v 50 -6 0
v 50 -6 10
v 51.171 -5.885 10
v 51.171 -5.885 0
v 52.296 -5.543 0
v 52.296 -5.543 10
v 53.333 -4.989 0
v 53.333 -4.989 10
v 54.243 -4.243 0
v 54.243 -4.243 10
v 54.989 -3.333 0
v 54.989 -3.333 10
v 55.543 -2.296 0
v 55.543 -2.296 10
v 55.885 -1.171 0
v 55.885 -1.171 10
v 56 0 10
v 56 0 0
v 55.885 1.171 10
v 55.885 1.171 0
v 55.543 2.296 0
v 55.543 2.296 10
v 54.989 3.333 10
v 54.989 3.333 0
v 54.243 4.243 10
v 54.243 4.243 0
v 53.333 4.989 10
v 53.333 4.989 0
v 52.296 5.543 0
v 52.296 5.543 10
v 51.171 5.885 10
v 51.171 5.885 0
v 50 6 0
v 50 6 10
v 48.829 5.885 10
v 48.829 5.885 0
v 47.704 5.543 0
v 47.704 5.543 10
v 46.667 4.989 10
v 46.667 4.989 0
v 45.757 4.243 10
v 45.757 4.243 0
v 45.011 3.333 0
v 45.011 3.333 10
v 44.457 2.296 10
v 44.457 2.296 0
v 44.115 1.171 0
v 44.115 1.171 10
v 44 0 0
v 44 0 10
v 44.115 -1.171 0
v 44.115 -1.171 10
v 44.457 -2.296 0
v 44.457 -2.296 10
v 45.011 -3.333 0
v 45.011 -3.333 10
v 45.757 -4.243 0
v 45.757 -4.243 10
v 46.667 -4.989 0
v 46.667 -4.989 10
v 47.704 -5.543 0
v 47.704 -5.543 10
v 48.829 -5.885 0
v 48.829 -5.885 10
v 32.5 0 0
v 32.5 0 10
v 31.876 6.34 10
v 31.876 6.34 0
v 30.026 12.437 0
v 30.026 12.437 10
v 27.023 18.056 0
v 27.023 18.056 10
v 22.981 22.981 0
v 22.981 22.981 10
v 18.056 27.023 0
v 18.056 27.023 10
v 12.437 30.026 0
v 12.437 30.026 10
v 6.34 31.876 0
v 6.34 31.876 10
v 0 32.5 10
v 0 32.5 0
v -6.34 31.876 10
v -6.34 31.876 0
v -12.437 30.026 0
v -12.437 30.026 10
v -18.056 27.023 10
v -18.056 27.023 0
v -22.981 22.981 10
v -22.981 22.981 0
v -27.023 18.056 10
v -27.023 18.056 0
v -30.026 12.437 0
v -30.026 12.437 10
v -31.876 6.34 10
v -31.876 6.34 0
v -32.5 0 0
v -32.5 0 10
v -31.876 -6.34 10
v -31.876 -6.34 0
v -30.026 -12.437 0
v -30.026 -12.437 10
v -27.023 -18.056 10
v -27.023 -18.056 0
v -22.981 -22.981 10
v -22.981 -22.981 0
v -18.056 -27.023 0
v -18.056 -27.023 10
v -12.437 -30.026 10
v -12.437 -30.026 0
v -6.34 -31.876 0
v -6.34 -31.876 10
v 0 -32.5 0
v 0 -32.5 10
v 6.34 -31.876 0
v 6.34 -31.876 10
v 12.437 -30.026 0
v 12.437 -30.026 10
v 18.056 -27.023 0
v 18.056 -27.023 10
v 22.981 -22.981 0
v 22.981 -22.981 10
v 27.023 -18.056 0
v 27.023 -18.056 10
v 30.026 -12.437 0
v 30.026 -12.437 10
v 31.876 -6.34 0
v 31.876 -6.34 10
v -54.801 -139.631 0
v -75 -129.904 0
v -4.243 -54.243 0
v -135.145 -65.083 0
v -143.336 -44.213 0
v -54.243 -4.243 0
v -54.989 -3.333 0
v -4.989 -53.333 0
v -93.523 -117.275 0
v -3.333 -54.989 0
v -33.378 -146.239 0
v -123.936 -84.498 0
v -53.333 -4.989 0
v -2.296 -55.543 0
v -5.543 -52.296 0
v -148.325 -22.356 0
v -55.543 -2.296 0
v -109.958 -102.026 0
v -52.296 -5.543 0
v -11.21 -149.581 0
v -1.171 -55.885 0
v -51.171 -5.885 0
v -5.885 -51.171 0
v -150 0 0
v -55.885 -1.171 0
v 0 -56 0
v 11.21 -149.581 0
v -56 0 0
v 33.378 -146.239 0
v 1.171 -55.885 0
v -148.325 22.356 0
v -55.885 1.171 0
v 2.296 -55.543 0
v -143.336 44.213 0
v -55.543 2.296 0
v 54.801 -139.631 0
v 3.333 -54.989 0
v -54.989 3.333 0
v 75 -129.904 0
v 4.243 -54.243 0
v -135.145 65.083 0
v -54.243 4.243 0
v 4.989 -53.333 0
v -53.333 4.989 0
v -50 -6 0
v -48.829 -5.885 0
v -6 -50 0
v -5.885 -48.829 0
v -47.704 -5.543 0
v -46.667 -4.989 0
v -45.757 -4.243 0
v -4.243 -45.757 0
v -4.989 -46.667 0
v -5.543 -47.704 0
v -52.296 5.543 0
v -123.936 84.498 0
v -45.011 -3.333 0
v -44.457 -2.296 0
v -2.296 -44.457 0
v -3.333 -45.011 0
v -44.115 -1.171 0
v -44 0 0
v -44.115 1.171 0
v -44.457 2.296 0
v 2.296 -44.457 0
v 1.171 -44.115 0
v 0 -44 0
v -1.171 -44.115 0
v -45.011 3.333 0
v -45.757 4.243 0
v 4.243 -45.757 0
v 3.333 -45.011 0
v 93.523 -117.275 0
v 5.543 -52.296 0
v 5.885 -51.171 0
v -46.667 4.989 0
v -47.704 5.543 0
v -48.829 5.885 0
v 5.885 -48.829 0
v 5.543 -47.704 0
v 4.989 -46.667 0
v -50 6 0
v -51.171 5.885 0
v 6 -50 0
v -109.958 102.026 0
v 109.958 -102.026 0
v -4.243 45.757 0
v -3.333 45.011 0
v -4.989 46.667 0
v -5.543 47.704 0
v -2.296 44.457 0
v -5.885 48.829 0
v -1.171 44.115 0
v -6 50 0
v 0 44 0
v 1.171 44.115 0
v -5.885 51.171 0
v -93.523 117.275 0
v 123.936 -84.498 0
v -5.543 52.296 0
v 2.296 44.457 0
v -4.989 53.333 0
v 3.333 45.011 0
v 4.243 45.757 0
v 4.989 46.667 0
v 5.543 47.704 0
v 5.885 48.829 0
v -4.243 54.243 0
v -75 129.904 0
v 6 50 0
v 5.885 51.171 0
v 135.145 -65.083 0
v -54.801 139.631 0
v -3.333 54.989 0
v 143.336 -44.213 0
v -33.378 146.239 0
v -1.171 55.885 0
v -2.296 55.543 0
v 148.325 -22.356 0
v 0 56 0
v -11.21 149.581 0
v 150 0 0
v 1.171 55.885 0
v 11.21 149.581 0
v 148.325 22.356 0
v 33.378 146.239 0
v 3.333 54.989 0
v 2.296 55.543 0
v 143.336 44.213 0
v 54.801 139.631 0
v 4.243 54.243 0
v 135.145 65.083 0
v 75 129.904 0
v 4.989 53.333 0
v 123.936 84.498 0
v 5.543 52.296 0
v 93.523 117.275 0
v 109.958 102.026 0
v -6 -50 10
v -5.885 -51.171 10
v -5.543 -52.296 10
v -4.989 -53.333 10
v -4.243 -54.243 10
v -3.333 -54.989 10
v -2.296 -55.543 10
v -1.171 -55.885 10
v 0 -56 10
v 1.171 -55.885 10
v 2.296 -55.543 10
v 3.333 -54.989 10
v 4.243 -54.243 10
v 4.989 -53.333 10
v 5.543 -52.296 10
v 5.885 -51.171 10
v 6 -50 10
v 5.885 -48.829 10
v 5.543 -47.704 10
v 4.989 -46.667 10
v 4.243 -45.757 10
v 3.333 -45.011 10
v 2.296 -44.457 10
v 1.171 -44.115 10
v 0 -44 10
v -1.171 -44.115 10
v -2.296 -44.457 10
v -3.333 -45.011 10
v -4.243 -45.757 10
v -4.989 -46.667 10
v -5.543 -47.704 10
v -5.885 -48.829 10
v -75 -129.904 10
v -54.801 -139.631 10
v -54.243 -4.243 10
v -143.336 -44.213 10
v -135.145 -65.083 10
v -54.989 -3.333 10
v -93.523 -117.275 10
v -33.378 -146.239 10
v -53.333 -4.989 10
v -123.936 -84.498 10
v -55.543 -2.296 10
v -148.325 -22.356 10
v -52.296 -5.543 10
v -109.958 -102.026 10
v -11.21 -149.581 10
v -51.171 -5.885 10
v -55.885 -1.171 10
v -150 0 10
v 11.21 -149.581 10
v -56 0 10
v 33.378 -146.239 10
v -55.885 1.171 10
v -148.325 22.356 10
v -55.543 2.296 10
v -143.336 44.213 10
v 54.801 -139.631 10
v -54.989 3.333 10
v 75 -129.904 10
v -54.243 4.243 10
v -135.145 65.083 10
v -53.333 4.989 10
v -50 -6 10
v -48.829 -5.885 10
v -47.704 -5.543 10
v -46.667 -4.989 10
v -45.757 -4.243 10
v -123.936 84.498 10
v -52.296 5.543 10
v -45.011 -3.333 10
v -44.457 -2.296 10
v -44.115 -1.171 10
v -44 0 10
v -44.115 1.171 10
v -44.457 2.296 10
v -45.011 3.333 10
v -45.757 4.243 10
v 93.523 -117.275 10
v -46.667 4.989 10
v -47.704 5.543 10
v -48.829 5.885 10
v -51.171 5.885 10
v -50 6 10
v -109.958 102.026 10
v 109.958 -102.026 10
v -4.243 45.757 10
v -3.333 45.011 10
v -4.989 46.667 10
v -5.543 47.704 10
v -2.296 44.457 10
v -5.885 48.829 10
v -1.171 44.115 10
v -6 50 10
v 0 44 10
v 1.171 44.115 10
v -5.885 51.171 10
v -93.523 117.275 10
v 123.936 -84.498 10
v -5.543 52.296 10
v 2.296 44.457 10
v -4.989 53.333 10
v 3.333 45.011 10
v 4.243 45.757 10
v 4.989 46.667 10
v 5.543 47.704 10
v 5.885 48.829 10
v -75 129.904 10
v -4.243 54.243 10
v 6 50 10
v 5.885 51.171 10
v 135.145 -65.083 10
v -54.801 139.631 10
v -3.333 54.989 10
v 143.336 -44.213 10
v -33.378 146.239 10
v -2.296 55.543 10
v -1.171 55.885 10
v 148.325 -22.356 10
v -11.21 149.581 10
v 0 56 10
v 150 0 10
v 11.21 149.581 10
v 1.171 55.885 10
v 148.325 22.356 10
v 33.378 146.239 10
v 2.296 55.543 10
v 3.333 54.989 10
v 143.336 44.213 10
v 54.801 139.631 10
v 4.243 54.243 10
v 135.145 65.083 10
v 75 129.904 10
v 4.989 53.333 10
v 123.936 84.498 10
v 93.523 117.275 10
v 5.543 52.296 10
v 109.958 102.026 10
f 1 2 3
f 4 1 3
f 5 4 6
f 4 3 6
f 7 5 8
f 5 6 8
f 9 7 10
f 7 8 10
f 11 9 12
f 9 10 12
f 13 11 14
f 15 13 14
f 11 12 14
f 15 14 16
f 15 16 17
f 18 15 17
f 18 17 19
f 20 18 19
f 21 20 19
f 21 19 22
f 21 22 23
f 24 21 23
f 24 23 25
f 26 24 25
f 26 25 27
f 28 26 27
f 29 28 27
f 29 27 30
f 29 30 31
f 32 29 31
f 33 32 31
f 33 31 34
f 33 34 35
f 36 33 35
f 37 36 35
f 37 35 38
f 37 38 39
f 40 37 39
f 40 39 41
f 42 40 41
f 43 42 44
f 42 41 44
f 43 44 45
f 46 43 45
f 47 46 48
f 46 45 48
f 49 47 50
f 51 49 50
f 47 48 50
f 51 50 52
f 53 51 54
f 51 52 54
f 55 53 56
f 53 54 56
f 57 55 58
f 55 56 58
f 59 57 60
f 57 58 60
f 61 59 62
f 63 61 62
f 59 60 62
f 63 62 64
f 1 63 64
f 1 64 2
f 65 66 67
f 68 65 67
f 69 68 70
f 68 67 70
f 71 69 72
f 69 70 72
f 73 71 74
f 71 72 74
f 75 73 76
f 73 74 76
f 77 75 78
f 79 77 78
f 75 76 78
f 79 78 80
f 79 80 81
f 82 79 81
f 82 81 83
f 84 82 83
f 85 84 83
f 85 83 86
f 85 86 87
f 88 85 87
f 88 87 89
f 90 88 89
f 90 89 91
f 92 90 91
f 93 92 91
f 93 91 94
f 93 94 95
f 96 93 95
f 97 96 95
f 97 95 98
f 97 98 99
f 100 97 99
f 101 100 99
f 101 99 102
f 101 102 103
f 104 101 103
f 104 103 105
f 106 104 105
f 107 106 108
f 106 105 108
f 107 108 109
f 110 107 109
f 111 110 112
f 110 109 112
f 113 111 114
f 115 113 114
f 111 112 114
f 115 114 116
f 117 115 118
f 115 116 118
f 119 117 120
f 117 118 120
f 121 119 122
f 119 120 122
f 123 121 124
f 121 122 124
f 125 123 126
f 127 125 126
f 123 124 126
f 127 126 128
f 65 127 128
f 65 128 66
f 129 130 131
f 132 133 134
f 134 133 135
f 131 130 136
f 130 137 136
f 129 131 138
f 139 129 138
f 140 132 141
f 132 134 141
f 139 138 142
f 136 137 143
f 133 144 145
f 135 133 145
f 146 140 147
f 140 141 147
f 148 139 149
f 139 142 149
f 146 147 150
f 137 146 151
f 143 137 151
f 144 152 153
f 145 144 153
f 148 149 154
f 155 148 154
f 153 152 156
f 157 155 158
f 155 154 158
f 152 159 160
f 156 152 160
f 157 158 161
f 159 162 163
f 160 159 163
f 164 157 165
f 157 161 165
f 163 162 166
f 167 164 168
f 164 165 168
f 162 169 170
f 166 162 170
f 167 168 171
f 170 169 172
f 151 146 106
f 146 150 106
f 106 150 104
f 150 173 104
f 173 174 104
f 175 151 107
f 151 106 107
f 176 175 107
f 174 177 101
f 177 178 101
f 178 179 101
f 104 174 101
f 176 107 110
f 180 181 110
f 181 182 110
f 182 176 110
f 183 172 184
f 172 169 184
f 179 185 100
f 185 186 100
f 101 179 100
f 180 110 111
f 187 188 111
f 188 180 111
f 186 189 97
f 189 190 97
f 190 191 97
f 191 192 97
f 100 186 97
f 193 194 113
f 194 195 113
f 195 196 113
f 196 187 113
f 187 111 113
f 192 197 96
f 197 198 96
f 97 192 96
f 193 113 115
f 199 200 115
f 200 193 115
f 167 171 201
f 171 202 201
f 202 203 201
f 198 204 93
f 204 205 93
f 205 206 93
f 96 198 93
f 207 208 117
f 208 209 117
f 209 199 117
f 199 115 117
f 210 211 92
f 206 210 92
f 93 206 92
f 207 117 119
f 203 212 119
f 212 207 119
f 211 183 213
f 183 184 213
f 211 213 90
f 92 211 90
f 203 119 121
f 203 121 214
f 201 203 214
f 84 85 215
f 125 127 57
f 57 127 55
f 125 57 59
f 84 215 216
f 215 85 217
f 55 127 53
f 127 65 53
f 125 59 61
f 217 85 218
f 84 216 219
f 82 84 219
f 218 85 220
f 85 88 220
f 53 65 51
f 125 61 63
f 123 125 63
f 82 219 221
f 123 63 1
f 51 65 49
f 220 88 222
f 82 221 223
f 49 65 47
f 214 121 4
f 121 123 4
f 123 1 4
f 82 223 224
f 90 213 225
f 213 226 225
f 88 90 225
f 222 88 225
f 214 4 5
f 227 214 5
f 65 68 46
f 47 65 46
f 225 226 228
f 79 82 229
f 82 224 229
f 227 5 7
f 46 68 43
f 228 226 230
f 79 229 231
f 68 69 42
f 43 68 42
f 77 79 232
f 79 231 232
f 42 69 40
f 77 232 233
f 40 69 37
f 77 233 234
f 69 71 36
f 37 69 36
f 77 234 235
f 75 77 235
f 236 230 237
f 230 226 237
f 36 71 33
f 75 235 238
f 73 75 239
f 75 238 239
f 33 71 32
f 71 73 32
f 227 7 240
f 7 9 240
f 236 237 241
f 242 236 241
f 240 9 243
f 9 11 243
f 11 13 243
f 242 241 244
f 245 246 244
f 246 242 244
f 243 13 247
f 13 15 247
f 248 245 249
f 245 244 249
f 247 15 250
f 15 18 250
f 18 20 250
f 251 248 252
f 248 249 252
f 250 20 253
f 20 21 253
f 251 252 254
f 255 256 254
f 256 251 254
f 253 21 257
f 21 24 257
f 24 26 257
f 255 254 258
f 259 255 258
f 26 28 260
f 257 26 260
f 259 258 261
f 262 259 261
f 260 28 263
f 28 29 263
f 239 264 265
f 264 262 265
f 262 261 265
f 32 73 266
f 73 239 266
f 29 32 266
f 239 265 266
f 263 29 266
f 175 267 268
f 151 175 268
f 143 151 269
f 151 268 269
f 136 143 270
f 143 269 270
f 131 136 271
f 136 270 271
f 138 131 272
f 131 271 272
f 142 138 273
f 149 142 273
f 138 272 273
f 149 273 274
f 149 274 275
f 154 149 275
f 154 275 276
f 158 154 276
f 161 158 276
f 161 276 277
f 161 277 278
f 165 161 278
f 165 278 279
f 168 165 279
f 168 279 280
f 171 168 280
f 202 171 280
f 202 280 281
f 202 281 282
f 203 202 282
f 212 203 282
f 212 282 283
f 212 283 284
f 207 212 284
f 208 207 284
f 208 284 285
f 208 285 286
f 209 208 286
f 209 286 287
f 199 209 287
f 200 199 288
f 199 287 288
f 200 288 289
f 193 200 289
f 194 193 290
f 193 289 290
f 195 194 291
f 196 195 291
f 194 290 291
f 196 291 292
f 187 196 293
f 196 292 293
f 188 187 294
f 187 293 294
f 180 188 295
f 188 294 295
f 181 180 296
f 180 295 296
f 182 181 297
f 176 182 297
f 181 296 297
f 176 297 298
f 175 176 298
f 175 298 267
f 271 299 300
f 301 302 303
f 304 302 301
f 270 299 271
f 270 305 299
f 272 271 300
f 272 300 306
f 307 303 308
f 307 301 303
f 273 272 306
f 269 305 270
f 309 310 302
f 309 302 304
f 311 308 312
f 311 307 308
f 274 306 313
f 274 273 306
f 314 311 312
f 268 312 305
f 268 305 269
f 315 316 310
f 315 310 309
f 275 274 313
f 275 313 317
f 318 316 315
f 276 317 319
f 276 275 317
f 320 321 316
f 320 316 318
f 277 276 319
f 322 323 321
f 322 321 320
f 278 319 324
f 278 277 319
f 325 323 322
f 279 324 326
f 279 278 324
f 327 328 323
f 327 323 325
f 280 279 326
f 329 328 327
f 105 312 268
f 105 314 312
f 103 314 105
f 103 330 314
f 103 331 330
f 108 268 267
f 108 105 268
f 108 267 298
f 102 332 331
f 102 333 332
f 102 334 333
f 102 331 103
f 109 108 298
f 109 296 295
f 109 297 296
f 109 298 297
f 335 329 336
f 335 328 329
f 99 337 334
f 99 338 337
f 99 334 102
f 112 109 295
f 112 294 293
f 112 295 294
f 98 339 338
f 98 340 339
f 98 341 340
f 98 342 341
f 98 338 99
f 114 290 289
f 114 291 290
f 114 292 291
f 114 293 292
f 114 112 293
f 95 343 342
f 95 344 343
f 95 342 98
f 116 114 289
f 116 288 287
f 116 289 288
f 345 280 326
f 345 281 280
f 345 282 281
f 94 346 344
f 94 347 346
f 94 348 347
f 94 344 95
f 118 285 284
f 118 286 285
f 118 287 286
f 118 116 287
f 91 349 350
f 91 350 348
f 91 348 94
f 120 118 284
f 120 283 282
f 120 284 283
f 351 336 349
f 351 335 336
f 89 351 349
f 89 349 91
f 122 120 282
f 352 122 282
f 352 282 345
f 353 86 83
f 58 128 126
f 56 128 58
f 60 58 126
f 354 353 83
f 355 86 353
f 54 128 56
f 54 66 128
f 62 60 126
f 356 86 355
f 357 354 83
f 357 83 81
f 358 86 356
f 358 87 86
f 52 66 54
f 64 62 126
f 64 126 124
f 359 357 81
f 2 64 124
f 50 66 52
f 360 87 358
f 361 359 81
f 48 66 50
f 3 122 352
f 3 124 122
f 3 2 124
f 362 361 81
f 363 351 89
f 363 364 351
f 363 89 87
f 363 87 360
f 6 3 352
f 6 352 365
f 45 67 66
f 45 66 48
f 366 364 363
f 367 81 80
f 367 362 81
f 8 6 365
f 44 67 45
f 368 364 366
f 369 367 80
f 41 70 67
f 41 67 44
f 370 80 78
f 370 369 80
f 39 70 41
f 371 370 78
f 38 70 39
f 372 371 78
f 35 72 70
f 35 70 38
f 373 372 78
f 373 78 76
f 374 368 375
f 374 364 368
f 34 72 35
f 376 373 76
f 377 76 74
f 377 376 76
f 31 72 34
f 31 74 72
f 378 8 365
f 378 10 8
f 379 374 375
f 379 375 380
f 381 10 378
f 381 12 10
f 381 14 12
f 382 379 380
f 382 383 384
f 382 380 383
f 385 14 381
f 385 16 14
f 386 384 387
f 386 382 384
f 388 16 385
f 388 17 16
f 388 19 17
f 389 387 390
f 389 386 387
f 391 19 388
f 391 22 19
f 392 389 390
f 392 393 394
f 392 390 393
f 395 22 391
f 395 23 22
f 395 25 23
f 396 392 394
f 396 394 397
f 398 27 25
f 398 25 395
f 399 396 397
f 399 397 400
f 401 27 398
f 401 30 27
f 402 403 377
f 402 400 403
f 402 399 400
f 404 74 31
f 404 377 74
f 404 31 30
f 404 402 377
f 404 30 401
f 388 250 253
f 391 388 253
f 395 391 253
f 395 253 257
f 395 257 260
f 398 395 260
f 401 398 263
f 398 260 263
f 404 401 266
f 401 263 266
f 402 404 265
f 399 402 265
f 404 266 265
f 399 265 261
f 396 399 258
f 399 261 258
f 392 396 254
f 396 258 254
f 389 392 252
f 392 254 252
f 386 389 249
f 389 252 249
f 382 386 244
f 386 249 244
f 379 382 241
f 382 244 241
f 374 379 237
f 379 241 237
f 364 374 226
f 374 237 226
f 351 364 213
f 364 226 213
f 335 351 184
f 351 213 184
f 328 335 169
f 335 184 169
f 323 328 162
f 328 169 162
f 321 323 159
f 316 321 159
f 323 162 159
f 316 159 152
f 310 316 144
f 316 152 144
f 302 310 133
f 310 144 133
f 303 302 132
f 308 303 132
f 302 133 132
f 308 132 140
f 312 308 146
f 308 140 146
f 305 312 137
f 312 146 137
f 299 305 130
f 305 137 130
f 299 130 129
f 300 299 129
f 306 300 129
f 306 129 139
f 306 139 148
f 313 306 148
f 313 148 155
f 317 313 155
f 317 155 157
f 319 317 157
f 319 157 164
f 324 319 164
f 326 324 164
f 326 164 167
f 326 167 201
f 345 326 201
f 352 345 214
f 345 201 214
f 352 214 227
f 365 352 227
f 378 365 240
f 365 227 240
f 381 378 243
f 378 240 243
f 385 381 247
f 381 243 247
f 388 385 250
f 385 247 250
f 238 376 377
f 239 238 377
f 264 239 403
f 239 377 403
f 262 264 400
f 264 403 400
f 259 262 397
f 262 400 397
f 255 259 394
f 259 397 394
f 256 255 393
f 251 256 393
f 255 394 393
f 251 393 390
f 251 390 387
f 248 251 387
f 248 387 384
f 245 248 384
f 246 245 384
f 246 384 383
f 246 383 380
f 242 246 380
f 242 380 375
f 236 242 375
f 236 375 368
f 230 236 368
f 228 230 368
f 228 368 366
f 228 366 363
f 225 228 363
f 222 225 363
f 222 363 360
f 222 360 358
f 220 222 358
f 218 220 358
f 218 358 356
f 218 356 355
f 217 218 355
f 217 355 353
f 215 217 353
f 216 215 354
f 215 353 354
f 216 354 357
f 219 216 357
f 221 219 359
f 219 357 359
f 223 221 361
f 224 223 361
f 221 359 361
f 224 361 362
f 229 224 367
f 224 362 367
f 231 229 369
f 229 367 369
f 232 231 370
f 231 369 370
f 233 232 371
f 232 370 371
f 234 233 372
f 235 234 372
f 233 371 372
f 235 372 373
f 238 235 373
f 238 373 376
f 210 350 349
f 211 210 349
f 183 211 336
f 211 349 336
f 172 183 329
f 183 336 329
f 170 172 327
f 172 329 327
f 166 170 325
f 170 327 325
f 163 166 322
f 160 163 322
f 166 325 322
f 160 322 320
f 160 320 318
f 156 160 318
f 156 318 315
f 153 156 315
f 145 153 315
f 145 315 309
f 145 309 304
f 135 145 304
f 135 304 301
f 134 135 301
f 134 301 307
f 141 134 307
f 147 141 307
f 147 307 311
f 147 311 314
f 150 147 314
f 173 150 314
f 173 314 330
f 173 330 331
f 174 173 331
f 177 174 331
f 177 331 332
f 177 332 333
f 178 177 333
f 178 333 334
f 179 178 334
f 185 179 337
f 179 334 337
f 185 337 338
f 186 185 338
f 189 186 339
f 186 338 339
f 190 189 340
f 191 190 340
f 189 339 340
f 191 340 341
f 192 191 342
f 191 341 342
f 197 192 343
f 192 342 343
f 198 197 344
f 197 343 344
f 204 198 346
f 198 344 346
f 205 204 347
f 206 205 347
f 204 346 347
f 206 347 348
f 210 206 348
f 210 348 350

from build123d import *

# Parameters (mm, degrees)
SKETCH_R           = 150
PAD_DEPTH          = 10
SKETCH001_R        = 6
POCKET_DEPTH       = 858.764807
POLARPATTERN_COUNT = 4
SKETCH002_R        = 32.5
POCKET001_DEPTH    = 10.001


with BuildPart() as part:
    # Sketch → Pad (new body)
    with BuildSketch(Plane.XY):
        Circle(SKETCH_R)
    extrude(amount=PAD_DEPTH)

    # Sketch001 (on Face3 of Pad) → Pocket (cut, through all)
    with BuildSketch(Plane.XY.offset(10)):
        with Locations((0, 50)):
            Circle(SKETCH001_R)
    pocket = extrude(amount=-POCKET_DEPTH, mode=Mode.SUBTRACT)

    # PolarPattern: Pocket ×4 about axis
    polarpattern_axis = Axis((0, 0, 10), (0, 0, 1))
    for i in range(1, POLARPATTERN_COUNT):
        add(pocket.rotate(polarpattern_axis, i * 360 / POLARPATTERN_COUNT), mode=Mode.SUBTRACT)

    # Sketch002 (on Face3 of PolarPattern) → Pocket001 (cut, through all)
    with BuildSketch(Plane.XY.offset(10)):
        Circle(SKETCH002_R)
    extrude(amount=-POCKET001_DEPTH, mode=Mode.SUBTRACT)


solid = part.part
